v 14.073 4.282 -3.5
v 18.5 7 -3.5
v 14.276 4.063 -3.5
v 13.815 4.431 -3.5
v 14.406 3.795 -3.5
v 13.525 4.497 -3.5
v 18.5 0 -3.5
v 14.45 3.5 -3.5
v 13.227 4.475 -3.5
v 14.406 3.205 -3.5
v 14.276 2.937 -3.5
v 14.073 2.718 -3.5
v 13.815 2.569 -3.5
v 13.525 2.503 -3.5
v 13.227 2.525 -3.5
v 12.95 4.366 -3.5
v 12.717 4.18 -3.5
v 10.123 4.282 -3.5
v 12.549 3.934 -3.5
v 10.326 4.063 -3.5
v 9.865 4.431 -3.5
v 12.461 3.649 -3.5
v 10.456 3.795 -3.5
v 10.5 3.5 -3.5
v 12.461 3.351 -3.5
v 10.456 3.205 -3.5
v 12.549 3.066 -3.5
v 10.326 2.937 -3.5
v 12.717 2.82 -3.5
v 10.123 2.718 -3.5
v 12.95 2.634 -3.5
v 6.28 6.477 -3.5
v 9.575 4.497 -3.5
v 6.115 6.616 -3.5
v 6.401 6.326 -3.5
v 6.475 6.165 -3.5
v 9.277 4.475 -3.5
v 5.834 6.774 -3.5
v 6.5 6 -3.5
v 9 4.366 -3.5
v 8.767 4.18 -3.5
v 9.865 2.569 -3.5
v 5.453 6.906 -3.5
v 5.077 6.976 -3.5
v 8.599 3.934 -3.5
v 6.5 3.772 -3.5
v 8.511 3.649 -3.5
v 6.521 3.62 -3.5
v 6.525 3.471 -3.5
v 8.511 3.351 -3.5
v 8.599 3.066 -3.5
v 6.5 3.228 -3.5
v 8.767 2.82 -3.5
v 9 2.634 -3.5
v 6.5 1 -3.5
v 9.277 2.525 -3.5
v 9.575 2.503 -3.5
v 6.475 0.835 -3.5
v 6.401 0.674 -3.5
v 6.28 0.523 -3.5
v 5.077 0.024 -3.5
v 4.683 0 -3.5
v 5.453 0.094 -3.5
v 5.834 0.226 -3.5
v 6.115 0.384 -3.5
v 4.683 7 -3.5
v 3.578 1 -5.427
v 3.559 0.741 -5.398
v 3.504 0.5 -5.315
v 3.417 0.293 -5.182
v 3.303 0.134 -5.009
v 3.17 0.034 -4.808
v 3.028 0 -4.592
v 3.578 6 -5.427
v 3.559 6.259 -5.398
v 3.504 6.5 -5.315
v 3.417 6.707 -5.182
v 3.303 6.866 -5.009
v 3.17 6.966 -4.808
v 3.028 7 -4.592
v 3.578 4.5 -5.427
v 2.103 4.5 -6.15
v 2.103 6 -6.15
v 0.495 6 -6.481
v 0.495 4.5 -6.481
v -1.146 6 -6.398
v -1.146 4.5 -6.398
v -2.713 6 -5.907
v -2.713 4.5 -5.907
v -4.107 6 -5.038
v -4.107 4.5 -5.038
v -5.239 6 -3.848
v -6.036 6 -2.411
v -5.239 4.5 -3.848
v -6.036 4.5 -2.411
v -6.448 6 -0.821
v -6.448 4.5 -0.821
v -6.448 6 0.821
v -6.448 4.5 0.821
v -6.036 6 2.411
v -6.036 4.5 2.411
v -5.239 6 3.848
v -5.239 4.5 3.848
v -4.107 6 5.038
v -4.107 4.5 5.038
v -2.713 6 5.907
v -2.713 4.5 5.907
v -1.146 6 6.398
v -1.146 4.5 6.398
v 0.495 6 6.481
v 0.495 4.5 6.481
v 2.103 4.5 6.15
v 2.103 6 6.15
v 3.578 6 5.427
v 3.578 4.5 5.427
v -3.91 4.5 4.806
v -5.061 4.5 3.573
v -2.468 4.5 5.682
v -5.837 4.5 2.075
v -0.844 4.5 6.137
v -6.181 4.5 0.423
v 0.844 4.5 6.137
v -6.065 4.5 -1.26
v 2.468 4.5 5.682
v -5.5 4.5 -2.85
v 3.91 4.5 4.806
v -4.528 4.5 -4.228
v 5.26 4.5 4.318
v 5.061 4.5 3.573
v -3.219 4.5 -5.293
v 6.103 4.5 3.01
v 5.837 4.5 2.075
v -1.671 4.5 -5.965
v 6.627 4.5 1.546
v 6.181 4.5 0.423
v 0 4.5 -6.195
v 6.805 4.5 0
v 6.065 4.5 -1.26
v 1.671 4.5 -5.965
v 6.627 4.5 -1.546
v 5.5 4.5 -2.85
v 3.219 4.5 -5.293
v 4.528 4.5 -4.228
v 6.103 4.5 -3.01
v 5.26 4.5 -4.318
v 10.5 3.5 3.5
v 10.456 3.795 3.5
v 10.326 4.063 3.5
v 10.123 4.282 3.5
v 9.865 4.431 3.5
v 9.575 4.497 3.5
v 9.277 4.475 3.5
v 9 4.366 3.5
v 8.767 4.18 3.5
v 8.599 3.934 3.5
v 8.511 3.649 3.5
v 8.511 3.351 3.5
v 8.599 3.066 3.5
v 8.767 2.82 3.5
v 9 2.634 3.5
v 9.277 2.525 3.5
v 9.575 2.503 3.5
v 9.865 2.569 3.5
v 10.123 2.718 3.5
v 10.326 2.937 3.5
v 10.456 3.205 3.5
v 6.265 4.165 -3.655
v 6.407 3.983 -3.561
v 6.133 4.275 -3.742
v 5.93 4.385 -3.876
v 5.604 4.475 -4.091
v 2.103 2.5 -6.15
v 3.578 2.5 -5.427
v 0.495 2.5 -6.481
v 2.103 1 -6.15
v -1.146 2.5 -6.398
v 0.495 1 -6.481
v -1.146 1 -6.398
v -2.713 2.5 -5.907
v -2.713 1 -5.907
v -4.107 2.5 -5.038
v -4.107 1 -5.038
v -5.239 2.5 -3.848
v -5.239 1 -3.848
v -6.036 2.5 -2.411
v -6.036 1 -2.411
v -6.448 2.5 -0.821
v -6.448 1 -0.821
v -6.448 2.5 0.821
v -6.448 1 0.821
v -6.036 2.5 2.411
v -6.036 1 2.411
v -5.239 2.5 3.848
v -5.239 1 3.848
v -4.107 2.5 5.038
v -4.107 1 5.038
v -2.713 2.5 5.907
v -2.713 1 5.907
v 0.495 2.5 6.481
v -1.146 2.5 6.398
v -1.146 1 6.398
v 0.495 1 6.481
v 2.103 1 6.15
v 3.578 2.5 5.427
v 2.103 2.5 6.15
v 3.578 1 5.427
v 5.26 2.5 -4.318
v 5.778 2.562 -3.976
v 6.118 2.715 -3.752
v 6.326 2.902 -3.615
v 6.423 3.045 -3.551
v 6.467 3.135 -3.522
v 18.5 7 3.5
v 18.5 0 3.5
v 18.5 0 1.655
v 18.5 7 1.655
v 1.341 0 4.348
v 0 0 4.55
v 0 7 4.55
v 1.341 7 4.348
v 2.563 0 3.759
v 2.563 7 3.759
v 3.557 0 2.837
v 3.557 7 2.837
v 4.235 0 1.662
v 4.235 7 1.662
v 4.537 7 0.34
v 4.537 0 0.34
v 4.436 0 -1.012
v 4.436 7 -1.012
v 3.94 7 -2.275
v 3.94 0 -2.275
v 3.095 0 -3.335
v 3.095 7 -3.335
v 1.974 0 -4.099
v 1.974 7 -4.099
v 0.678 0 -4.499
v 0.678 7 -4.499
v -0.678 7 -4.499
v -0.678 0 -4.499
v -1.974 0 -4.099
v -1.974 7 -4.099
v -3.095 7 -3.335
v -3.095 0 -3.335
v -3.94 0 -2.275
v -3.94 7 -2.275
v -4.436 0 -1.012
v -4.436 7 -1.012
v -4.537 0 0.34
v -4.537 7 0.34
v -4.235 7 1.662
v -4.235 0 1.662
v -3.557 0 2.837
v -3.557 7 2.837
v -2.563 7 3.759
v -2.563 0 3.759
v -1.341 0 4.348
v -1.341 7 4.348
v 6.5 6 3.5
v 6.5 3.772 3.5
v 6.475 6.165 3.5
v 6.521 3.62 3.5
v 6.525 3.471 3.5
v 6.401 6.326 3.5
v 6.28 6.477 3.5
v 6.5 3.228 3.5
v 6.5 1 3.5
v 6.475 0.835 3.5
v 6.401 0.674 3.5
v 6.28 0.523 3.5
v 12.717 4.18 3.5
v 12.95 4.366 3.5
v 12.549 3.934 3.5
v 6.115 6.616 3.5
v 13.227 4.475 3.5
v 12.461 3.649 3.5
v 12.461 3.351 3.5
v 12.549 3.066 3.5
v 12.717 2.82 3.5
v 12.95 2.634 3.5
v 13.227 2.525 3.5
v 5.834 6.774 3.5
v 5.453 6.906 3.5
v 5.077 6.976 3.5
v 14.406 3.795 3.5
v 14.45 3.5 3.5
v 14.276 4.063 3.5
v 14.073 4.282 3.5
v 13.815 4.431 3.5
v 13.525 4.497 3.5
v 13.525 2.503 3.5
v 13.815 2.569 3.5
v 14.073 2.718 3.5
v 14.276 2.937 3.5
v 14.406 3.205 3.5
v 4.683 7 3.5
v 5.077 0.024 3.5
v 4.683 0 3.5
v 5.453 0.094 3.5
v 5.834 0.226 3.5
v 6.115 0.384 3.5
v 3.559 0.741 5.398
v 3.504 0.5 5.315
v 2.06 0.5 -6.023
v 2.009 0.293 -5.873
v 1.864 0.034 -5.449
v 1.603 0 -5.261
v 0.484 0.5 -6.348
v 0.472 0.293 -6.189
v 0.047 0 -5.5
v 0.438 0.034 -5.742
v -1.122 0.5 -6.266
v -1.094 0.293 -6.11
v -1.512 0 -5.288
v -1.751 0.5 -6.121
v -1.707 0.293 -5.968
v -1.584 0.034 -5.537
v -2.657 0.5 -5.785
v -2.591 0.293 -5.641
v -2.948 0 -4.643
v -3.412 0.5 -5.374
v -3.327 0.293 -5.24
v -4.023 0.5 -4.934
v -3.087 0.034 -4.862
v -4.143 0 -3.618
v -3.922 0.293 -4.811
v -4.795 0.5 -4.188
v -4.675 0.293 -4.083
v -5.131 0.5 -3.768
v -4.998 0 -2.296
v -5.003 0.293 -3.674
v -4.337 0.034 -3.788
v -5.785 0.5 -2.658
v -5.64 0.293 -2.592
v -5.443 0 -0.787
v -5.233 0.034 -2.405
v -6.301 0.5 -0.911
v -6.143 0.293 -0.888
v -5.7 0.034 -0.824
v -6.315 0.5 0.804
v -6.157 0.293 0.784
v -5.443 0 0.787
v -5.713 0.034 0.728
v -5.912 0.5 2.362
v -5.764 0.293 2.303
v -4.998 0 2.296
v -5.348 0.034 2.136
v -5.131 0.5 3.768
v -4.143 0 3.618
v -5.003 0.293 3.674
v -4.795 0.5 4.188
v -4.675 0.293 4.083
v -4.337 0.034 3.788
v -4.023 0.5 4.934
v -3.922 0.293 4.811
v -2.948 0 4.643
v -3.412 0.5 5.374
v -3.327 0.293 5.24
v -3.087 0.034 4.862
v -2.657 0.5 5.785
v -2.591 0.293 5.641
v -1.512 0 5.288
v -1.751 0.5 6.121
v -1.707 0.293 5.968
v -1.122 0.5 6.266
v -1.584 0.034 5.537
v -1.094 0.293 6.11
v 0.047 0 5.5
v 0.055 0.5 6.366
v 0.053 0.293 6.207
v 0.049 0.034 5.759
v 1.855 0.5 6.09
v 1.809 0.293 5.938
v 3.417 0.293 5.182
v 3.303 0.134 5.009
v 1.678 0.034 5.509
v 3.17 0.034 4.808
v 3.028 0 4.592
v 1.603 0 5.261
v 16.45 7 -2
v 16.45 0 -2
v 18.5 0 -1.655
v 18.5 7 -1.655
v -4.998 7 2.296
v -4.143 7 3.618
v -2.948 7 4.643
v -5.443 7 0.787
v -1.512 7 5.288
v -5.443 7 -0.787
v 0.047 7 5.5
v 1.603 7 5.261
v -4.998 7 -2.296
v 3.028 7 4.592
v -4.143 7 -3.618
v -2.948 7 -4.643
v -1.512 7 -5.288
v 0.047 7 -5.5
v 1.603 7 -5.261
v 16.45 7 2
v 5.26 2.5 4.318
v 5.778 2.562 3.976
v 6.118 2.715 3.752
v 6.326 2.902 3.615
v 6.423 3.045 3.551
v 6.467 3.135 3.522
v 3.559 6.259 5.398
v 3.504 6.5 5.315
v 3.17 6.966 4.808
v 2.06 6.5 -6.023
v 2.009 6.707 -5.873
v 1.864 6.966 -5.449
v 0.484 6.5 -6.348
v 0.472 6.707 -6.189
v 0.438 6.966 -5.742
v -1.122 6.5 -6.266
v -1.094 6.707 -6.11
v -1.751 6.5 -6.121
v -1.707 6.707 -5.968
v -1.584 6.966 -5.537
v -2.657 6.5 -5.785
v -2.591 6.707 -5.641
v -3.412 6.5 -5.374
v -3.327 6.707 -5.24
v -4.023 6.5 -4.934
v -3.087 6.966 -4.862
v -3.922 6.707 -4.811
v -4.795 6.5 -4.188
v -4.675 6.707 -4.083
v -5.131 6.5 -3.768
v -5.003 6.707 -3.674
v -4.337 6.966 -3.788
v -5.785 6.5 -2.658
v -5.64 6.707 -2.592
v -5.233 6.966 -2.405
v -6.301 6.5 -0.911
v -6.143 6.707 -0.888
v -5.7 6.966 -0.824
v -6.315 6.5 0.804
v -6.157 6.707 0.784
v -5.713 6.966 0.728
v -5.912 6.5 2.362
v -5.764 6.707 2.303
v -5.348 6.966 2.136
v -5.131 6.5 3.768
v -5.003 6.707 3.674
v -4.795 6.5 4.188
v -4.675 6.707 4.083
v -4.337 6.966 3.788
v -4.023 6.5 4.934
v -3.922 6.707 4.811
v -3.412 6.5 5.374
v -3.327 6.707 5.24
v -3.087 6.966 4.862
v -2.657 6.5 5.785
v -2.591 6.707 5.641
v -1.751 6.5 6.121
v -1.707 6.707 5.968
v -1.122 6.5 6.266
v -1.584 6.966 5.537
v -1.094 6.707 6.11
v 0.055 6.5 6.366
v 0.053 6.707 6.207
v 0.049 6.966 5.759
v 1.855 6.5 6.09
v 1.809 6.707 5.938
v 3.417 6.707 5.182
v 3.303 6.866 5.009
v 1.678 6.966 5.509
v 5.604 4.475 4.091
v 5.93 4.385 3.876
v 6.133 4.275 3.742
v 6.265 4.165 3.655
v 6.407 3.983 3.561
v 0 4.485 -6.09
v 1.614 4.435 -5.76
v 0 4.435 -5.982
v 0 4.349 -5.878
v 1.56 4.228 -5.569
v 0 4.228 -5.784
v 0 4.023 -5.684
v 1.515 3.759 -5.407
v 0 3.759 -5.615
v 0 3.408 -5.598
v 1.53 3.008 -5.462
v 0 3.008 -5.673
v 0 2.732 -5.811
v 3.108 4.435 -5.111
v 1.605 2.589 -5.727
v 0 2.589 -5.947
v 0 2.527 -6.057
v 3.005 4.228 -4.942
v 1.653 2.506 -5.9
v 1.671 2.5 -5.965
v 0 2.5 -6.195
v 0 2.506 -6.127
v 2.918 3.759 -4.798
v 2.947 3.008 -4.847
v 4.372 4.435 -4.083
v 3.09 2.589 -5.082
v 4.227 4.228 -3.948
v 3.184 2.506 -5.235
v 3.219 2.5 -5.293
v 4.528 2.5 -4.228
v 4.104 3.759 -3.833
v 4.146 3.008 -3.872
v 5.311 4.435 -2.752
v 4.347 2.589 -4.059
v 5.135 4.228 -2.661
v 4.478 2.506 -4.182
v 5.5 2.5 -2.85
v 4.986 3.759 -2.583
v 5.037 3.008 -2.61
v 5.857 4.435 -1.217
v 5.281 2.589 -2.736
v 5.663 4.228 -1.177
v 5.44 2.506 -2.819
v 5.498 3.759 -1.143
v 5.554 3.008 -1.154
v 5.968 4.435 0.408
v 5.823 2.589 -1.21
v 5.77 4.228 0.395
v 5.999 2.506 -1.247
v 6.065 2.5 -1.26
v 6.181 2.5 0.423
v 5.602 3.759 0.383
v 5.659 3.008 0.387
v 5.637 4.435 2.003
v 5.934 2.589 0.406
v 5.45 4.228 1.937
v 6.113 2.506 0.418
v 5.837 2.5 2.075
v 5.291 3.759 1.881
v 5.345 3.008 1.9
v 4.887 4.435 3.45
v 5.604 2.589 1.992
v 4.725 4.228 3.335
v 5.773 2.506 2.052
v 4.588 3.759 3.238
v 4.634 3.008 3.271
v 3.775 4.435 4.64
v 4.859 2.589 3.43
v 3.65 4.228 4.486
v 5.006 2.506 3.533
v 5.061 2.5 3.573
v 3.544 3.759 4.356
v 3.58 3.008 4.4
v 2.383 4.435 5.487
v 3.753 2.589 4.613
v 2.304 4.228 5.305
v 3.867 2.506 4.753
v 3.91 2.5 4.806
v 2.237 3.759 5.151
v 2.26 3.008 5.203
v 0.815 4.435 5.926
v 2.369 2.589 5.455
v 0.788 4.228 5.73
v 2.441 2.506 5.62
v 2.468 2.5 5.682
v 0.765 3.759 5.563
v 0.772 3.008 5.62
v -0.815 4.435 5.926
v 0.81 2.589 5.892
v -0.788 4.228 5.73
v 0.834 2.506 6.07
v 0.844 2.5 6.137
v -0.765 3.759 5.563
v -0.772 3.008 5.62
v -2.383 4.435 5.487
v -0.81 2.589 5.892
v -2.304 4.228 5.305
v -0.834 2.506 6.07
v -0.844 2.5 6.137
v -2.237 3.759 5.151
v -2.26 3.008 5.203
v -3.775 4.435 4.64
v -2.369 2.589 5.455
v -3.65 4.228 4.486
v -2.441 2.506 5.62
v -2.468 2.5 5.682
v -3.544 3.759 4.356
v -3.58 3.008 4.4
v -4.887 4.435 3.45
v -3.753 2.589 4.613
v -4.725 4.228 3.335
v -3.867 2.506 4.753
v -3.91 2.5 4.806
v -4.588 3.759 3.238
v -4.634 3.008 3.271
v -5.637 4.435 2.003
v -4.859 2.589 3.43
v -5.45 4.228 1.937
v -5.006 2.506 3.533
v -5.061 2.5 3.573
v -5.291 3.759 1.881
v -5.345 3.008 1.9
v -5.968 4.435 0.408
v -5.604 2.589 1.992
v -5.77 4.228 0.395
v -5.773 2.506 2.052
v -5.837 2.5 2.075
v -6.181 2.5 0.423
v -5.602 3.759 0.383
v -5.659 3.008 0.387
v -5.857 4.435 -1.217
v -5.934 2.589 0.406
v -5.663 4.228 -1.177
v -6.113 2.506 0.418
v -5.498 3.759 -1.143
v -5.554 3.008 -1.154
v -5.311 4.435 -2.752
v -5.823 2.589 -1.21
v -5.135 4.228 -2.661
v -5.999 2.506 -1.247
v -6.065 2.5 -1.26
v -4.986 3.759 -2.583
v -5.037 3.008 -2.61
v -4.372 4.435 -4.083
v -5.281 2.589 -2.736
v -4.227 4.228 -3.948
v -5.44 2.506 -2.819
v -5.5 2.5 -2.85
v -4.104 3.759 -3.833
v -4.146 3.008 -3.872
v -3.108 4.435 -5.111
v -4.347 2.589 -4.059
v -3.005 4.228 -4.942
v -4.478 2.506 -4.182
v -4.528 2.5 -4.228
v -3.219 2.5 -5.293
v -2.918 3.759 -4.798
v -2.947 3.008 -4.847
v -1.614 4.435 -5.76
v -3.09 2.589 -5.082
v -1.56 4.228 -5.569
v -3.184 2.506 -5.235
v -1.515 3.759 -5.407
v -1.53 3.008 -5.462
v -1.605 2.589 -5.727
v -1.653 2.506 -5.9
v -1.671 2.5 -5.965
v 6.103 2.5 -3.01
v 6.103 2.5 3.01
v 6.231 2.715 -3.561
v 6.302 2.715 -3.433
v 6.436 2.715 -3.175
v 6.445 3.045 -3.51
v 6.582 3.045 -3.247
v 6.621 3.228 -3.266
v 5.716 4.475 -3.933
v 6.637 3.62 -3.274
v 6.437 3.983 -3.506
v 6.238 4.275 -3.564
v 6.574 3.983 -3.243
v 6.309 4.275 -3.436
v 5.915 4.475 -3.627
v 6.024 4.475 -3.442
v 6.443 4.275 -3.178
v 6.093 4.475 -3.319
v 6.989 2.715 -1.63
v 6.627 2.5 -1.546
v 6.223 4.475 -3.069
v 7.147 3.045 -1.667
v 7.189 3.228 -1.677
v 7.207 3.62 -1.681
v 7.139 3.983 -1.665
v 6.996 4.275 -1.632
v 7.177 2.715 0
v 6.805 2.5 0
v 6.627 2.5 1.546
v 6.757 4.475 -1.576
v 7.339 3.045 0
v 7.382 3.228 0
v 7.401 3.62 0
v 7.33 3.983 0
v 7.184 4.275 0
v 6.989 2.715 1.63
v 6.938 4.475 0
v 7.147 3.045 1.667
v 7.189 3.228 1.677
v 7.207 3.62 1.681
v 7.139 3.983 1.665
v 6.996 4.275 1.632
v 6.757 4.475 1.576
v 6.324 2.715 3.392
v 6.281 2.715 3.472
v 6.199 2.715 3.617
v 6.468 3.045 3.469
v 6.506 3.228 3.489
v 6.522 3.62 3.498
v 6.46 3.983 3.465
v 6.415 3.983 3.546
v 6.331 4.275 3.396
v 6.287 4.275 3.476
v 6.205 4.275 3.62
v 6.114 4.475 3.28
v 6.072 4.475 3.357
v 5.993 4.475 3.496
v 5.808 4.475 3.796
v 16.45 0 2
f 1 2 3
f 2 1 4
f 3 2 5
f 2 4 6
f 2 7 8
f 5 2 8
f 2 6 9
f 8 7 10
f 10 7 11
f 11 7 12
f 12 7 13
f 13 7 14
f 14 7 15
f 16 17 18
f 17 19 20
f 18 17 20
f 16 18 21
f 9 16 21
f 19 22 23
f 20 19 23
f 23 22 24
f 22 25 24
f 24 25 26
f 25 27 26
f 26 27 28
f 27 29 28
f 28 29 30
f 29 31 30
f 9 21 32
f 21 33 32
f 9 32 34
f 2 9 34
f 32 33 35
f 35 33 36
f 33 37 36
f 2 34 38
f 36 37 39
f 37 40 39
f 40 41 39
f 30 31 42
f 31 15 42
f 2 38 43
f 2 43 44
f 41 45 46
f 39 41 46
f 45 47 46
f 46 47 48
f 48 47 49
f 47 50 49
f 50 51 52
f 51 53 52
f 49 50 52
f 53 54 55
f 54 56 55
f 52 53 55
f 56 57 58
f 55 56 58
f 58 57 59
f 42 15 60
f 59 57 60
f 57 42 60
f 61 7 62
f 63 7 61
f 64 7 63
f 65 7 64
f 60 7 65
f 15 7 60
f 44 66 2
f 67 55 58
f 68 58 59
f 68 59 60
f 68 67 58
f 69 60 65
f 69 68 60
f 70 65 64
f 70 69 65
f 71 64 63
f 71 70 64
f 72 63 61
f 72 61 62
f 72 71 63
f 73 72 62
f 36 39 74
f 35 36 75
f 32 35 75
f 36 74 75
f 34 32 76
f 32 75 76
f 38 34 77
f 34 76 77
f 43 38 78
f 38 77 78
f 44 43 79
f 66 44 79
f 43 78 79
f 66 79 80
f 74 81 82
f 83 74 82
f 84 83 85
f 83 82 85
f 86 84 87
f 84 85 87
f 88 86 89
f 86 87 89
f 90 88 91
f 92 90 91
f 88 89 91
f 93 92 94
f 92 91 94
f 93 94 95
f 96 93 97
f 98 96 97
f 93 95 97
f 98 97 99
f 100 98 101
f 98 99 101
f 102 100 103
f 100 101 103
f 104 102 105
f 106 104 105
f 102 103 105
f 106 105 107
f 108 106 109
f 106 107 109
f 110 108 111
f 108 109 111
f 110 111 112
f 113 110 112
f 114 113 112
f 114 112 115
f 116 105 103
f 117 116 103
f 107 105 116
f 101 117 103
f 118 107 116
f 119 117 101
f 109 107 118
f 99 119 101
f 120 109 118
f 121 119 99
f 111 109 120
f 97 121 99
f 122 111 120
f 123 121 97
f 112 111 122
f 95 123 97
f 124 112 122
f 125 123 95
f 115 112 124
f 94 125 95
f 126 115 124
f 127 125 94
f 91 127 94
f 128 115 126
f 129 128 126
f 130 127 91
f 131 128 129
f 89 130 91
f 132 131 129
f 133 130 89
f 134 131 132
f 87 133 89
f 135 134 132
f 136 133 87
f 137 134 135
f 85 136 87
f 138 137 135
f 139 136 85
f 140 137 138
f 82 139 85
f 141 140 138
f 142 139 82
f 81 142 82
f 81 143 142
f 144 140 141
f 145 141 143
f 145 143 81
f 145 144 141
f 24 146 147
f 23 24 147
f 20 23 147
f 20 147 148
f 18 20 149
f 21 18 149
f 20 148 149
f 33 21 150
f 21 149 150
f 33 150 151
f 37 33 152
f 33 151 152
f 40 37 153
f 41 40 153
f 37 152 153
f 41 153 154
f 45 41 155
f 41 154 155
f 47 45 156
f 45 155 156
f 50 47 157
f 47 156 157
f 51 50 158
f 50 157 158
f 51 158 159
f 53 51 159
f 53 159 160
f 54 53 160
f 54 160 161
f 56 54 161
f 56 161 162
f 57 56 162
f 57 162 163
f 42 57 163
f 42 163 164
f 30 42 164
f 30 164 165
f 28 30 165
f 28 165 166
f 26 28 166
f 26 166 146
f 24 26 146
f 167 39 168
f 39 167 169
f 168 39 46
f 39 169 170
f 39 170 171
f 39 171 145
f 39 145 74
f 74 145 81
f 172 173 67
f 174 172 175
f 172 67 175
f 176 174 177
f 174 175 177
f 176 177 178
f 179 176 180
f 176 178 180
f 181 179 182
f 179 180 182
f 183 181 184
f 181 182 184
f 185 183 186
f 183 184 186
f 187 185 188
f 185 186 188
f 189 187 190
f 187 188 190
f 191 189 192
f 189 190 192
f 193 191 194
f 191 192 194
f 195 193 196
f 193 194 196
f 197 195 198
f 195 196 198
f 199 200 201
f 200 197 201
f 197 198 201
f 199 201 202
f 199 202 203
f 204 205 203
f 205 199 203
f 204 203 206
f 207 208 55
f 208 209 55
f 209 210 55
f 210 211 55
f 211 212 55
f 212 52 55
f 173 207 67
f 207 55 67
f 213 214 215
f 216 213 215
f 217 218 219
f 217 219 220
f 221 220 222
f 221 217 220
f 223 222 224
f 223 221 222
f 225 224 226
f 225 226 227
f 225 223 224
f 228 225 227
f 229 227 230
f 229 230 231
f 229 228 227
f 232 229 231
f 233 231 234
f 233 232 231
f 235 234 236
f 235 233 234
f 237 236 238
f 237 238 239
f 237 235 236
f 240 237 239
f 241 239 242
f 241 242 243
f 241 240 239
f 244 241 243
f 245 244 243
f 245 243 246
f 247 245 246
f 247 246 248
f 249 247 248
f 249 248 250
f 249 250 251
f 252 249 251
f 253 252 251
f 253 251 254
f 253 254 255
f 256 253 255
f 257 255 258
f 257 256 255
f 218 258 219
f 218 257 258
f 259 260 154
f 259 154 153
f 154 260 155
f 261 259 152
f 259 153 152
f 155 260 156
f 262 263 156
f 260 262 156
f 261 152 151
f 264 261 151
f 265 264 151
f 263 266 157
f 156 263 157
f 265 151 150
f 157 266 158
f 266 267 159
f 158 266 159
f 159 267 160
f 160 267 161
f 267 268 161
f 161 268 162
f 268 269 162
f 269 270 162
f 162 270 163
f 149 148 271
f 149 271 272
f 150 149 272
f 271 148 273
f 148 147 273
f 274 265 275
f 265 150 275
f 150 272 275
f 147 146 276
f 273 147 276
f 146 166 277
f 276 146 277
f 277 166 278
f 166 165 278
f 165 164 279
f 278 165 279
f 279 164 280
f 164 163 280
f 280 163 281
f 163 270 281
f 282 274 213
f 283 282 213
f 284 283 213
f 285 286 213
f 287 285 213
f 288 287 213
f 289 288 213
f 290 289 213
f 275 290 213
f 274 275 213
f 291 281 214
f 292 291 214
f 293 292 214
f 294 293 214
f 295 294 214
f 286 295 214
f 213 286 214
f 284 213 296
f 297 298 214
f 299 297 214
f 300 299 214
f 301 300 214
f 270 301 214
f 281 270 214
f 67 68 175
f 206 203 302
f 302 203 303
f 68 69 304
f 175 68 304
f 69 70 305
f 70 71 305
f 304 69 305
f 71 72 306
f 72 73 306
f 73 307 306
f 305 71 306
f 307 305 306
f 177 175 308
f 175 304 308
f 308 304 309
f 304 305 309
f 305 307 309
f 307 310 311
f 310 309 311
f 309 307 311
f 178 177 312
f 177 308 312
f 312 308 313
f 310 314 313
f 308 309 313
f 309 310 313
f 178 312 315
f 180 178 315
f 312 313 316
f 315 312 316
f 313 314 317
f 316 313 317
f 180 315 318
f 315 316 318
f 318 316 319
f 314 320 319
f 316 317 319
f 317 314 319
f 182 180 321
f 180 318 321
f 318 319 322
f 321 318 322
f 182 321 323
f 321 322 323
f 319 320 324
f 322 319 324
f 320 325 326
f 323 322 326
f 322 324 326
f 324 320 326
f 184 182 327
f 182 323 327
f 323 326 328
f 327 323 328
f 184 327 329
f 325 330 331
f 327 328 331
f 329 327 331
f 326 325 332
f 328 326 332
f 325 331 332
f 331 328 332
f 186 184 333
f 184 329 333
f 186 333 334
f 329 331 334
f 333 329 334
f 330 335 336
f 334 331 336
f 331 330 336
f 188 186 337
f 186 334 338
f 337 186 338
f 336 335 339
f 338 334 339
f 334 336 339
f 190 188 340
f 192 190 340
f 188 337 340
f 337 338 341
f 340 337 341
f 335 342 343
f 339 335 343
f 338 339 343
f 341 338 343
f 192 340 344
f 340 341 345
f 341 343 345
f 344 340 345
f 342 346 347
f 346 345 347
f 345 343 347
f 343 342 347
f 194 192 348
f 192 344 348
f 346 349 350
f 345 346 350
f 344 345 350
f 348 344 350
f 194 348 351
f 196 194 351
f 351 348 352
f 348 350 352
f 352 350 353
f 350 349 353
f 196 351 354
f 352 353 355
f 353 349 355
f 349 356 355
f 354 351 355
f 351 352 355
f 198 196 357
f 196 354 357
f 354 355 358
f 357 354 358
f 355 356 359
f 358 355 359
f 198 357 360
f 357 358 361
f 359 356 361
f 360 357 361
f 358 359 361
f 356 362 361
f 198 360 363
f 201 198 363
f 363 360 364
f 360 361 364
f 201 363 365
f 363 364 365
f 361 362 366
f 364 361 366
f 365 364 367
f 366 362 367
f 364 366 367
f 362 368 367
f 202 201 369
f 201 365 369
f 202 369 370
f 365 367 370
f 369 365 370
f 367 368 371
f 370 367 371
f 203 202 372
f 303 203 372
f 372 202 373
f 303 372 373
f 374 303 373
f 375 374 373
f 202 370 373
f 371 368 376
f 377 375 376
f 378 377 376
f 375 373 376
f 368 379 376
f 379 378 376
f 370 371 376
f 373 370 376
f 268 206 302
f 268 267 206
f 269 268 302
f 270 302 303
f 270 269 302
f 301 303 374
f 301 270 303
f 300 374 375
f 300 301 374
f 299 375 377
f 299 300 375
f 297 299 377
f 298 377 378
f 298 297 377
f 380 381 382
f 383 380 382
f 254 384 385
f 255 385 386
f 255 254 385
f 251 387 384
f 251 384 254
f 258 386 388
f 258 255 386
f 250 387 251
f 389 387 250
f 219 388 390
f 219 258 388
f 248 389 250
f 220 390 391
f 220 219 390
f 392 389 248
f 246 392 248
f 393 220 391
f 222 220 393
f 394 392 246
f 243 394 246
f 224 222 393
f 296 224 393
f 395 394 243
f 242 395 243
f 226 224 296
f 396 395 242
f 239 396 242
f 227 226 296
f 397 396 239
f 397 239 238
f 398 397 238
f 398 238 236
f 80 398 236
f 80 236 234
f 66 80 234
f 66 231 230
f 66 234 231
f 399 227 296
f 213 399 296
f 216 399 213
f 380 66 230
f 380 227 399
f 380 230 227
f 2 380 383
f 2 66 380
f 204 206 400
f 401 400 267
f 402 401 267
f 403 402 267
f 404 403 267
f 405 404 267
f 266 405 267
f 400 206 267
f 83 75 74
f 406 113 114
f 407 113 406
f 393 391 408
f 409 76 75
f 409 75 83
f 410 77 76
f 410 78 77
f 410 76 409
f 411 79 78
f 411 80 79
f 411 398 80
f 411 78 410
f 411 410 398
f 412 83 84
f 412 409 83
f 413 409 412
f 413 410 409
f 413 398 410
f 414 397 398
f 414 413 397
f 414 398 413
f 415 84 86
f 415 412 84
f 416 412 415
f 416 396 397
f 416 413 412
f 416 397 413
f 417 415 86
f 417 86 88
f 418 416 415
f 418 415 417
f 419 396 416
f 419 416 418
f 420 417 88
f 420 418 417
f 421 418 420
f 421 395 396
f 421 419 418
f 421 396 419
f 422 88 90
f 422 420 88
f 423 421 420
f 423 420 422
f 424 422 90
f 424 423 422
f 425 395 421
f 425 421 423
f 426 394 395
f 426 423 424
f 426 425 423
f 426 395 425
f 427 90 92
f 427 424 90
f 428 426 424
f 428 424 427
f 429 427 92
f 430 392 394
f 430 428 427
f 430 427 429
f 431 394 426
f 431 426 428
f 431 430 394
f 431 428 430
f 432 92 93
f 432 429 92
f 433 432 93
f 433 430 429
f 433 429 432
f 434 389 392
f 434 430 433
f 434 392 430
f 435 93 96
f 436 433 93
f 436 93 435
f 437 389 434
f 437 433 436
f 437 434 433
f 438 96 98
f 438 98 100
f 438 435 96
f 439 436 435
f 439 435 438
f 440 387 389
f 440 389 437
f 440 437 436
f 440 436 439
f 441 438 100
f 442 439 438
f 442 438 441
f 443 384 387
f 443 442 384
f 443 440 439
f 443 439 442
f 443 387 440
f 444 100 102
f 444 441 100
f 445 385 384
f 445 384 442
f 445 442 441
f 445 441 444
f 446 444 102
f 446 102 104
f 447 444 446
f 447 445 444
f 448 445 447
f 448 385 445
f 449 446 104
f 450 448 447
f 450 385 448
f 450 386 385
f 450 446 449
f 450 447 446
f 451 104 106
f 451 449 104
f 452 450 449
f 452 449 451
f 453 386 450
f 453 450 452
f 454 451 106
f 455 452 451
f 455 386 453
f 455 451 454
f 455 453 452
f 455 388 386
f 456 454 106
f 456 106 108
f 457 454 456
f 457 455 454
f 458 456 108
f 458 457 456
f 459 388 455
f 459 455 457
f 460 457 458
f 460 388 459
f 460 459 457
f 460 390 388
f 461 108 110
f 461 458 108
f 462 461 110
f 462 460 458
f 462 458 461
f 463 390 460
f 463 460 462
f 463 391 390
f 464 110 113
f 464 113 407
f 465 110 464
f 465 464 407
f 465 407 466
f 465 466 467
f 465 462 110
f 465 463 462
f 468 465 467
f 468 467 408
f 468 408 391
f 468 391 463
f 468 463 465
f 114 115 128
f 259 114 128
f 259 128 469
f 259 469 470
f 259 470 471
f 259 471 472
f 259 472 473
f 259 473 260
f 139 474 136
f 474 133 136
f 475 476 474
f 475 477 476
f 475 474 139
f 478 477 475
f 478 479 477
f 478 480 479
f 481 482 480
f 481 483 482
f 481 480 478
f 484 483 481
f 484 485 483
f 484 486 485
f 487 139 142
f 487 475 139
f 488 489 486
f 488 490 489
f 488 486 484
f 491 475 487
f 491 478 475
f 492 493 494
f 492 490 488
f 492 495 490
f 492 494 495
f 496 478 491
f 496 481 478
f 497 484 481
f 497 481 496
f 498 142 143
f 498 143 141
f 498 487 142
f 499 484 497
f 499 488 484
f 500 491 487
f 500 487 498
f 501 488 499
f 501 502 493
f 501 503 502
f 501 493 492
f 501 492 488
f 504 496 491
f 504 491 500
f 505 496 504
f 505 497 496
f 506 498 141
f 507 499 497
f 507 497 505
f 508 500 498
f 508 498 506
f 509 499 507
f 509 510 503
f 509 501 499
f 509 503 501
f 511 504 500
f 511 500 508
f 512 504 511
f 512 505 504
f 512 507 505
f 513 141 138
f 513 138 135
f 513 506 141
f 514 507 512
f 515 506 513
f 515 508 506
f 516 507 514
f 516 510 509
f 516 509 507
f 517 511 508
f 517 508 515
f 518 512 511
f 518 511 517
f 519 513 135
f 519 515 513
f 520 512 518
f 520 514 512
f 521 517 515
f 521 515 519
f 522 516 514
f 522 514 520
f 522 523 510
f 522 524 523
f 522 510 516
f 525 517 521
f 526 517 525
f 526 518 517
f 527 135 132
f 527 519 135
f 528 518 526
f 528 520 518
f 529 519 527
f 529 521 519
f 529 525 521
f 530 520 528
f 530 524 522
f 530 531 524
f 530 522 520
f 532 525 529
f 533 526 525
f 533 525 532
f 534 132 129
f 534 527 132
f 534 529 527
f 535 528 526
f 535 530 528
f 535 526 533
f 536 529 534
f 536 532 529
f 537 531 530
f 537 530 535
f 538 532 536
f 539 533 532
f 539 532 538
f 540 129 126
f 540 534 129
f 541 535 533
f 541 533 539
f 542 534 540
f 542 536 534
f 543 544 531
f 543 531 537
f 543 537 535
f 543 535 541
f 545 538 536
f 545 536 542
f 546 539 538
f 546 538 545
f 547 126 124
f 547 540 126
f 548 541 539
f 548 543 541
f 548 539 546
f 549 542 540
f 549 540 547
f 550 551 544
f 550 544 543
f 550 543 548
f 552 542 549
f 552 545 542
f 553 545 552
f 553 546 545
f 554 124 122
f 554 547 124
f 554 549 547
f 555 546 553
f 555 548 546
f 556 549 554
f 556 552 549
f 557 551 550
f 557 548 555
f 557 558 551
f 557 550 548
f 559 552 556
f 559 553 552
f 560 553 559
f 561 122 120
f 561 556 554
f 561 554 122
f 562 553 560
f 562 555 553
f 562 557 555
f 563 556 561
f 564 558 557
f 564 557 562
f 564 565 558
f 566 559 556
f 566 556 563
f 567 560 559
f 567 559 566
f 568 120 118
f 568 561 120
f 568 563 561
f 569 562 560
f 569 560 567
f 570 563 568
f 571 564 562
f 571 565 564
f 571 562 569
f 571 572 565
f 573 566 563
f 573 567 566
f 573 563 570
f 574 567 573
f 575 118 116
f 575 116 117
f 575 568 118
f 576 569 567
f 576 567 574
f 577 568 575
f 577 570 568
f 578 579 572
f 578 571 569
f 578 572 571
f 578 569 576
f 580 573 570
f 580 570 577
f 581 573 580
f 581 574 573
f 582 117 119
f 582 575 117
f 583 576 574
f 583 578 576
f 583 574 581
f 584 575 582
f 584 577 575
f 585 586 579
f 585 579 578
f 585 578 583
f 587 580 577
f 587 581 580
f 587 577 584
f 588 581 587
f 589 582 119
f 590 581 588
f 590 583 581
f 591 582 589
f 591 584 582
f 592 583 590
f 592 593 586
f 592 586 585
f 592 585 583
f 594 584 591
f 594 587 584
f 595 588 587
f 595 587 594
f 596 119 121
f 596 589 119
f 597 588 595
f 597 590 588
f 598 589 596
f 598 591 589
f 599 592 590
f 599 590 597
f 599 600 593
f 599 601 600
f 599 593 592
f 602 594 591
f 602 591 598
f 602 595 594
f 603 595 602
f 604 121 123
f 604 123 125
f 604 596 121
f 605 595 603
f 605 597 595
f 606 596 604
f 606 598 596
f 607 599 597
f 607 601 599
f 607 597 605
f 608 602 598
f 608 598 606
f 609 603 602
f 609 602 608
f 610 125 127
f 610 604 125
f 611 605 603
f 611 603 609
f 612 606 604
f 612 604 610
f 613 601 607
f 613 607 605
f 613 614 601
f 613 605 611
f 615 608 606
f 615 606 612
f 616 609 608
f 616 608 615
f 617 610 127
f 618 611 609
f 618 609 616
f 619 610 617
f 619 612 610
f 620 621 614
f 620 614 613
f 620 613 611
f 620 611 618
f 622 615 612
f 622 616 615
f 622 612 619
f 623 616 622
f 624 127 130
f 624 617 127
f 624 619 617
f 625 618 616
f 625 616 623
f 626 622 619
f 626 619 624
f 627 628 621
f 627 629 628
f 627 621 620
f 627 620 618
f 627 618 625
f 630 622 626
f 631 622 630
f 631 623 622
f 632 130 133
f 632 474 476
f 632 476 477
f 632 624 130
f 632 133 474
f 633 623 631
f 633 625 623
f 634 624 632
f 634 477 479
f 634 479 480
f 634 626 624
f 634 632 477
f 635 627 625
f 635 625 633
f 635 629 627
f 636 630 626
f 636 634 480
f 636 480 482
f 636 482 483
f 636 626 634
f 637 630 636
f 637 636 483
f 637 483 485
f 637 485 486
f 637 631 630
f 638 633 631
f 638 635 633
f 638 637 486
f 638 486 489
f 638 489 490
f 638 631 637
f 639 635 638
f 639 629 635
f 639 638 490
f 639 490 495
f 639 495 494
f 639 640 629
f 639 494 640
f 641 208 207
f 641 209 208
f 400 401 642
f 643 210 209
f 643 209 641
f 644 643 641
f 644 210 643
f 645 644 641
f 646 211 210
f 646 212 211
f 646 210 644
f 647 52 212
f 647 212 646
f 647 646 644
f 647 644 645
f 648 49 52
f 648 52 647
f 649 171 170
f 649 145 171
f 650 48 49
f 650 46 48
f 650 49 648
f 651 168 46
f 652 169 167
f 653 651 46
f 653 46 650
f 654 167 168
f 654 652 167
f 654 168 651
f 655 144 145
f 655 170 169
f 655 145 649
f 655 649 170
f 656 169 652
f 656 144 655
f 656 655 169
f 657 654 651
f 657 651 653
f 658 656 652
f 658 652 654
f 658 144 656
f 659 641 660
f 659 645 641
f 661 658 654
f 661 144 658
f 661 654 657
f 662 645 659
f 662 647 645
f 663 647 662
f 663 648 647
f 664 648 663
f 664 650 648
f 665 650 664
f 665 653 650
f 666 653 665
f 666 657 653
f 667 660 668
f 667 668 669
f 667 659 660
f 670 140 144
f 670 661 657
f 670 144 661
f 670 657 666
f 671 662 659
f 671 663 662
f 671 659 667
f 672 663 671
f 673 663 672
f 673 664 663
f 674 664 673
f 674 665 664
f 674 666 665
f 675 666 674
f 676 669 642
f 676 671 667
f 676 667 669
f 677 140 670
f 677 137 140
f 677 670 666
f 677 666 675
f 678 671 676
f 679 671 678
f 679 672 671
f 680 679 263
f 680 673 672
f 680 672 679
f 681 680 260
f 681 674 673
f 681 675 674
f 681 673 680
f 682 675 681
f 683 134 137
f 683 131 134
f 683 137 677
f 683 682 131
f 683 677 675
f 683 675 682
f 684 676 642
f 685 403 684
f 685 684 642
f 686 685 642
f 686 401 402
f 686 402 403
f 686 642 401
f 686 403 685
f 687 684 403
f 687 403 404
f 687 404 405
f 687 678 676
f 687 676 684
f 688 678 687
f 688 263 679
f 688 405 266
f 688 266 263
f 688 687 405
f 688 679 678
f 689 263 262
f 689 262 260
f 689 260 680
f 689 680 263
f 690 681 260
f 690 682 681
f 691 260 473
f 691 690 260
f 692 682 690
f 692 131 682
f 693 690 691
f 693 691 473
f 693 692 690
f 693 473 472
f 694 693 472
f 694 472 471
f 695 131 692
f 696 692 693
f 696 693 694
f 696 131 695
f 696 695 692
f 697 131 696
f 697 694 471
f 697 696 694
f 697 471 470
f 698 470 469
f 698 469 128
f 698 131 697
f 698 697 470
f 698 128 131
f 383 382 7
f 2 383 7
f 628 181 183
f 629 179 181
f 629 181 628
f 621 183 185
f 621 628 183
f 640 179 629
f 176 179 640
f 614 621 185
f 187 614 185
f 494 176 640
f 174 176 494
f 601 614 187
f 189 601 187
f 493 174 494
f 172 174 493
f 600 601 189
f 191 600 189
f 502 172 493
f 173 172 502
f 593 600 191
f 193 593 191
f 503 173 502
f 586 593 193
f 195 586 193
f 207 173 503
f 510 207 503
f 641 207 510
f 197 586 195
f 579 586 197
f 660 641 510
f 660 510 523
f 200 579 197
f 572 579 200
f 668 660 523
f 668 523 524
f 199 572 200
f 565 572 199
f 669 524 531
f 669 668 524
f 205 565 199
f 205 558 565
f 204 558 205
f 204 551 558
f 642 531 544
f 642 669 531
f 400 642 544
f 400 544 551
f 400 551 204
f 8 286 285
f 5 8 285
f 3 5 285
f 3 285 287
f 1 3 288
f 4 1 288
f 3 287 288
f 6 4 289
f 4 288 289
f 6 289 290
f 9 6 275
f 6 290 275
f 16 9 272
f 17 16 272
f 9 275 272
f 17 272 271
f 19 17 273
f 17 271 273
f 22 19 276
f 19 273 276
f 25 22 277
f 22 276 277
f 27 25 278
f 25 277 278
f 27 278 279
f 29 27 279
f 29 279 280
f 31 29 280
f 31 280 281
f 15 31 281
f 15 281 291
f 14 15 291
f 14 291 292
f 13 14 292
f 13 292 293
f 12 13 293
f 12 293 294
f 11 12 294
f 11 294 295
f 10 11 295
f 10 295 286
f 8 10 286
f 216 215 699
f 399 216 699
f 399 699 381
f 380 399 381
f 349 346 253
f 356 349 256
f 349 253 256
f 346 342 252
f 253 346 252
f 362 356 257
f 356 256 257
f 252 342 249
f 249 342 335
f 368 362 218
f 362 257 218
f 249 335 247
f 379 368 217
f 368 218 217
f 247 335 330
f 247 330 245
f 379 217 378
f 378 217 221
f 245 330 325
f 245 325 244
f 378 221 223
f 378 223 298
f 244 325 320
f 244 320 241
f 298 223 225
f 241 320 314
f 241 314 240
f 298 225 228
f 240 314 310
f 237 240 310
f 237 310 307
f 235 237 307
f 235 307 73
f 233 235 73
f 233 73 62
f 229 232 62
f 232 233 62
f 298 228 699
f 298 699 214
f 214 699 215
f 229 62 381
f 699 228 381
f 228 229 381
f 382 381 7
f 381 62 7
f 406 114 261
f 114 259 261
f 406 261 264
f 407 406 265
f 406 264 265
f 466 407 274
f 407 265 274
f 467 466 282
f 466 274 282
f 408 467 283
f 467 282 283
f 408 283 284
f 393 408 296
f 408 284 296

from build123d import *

# Parameters (mm, degrees)
SKETCH1_R           = 4.55
BOSS_EXTRUDE2_DEPTH = 7
CUT_EXTRUDE1_REACH  = 24.164
SKETCH3_R           = 1
FILLET4_R           = 1


with BuildPart() as part:
    # Sketch1 → Boss-Extrude2 (new body)
    with BuildSketch(Plane(origin=(0, 0, 0), x_dir=(1, 0, 0), z_dir=(0, 1, 0))):
        with BuildLine():
            Line((6.5, 3.5), (3.577981651, 5.426605505))
            ThreePointArc((3.577981651, 5.426605505), (-6.5, 0), (3.577981651, -5.426605505))
            Line((3.577981651, -5.426605505), (6.5, -3.5))
            Line((6.5, -3.5), (18.5, -3.5))
            Line((18.5, -3.5), (18.5, -1.655))
            Line((18.5, -1.655), (16.45, -2))
            Line((16.45, -2), (16.45, 2))
            Line((16.45, 2), (18.5, 1.655))
            Line((18.5, 1.655), (18.5, 3.5))
            Line((18.5, 3.5), (6.5, 3.5))
        make_face()
        with Locations(Location((0, 0, 0), (0, 0, 270))):
            Circle(SKETCH1_R, mode=Mode.SUBTRACT)
    extrude(amount=BOSS_EXTRUDE2_DEPTH)

    # Sketch2 → Cut-Revolve1 (revolve, cut)
    with BuildSketch(Plane(origin=(0, 0, 0), x_dir=(0, -1, 0), z_dir=(1, 0, 0))):
        with BuildLine():
            Line((-4.5, 6.805), (-4.5, 6.195))
            add(Edge.make_bspline(
                [(-4.5, 6.195), (-4.5, 5.595), (-3.5, 5.595), (-2.5, 5.595), (-2.5, 6.195)],
                knots=[0, 0, 0, 1.570796327, 1.570796327, 3.141592654, 3.141592654, 3.141592654], degree=2, weights=[1, 0.707106781, 1, 0.707106781, 1]))
            Line((-2.5, 6.195), (-2.5, 6.805))
            add(Edge.make_bspline(
                [(-2.5, 6.805), (-2.499999858, 7.405000085), (-3.5, 7.405000085), (-4.500000142, 7.405000085), (-4.5, 6.805)],
                knots=[3.141592512, 3.141592512, 3.141592512, 4.71238898, 4.71238898, 6.283185449, 6.283185449, 6.283185449], degree=2, weights=[1, 0.707106731, 1, 0.707106731, 1]))
        make_face()
    revolve(axis=Axis((0, 7.335318457, 0), (0, -1, 0)), mode=Mode.SUBTRACT)

    # Sketch3 → Cut-Extrude1 (cut, up to next)
    with BuildSketch(Plane.XY.offset(3.5), mode=Mode.PRIVATE) as cut_extrude1_sk1:
        with Locations((13.45, 3.5)):
            Circle(SKETCH3_R)
    cut_extrude1_tool1 = extrude(cut_extrude1_sk1.sketch, amount=-CUT_EXTRUDE1_REACH, mode=Mode.PRIVATE) & part.part
    # Sketch3 → Cut-Extrude1 (cut, up to next)
    with BuildSketch(Plane.XY.offset(3.5), mode=Mode.PRIVATE) as cut_extrude1_sk2:
        with Locations((9.5, 3.5)):
            Circle(SKETCH3_R)
    cut_extrude1_tool2 = extrude(cut_extrude1_sk2.sketch, amount=-CUT_EXTRUDE1_REACH, mode=Mode.PRIVATE) & part.part
    add(cut_extrude1_tool1.solids().sort_by_distance((13.45, 3.5, 3.5))[0], mode=Mode.SUBTRACT)
    add(cut_extrude1_tool2.solids().sort_by_distance((9.5, 3.5, 3.5))[0], mode=Mode.SUBTRACT)

    # Fillet4
    fillet4_edges = [part.edges().sort_by_distance(p)[0] for p in [
        (5.038990826, 7, -4.463302752),
        (5.038990826, 0, -4.463302752),
        (-6.5, 0, 0),
        (5.038990826, 0, 4.463302752),
        (5.038990826, 7, 4.463302752),
        (-6.5, 7, 0),
    ]]
    fillet(fillet4_edges, radius=FILLET4_R)


solid = part.part
